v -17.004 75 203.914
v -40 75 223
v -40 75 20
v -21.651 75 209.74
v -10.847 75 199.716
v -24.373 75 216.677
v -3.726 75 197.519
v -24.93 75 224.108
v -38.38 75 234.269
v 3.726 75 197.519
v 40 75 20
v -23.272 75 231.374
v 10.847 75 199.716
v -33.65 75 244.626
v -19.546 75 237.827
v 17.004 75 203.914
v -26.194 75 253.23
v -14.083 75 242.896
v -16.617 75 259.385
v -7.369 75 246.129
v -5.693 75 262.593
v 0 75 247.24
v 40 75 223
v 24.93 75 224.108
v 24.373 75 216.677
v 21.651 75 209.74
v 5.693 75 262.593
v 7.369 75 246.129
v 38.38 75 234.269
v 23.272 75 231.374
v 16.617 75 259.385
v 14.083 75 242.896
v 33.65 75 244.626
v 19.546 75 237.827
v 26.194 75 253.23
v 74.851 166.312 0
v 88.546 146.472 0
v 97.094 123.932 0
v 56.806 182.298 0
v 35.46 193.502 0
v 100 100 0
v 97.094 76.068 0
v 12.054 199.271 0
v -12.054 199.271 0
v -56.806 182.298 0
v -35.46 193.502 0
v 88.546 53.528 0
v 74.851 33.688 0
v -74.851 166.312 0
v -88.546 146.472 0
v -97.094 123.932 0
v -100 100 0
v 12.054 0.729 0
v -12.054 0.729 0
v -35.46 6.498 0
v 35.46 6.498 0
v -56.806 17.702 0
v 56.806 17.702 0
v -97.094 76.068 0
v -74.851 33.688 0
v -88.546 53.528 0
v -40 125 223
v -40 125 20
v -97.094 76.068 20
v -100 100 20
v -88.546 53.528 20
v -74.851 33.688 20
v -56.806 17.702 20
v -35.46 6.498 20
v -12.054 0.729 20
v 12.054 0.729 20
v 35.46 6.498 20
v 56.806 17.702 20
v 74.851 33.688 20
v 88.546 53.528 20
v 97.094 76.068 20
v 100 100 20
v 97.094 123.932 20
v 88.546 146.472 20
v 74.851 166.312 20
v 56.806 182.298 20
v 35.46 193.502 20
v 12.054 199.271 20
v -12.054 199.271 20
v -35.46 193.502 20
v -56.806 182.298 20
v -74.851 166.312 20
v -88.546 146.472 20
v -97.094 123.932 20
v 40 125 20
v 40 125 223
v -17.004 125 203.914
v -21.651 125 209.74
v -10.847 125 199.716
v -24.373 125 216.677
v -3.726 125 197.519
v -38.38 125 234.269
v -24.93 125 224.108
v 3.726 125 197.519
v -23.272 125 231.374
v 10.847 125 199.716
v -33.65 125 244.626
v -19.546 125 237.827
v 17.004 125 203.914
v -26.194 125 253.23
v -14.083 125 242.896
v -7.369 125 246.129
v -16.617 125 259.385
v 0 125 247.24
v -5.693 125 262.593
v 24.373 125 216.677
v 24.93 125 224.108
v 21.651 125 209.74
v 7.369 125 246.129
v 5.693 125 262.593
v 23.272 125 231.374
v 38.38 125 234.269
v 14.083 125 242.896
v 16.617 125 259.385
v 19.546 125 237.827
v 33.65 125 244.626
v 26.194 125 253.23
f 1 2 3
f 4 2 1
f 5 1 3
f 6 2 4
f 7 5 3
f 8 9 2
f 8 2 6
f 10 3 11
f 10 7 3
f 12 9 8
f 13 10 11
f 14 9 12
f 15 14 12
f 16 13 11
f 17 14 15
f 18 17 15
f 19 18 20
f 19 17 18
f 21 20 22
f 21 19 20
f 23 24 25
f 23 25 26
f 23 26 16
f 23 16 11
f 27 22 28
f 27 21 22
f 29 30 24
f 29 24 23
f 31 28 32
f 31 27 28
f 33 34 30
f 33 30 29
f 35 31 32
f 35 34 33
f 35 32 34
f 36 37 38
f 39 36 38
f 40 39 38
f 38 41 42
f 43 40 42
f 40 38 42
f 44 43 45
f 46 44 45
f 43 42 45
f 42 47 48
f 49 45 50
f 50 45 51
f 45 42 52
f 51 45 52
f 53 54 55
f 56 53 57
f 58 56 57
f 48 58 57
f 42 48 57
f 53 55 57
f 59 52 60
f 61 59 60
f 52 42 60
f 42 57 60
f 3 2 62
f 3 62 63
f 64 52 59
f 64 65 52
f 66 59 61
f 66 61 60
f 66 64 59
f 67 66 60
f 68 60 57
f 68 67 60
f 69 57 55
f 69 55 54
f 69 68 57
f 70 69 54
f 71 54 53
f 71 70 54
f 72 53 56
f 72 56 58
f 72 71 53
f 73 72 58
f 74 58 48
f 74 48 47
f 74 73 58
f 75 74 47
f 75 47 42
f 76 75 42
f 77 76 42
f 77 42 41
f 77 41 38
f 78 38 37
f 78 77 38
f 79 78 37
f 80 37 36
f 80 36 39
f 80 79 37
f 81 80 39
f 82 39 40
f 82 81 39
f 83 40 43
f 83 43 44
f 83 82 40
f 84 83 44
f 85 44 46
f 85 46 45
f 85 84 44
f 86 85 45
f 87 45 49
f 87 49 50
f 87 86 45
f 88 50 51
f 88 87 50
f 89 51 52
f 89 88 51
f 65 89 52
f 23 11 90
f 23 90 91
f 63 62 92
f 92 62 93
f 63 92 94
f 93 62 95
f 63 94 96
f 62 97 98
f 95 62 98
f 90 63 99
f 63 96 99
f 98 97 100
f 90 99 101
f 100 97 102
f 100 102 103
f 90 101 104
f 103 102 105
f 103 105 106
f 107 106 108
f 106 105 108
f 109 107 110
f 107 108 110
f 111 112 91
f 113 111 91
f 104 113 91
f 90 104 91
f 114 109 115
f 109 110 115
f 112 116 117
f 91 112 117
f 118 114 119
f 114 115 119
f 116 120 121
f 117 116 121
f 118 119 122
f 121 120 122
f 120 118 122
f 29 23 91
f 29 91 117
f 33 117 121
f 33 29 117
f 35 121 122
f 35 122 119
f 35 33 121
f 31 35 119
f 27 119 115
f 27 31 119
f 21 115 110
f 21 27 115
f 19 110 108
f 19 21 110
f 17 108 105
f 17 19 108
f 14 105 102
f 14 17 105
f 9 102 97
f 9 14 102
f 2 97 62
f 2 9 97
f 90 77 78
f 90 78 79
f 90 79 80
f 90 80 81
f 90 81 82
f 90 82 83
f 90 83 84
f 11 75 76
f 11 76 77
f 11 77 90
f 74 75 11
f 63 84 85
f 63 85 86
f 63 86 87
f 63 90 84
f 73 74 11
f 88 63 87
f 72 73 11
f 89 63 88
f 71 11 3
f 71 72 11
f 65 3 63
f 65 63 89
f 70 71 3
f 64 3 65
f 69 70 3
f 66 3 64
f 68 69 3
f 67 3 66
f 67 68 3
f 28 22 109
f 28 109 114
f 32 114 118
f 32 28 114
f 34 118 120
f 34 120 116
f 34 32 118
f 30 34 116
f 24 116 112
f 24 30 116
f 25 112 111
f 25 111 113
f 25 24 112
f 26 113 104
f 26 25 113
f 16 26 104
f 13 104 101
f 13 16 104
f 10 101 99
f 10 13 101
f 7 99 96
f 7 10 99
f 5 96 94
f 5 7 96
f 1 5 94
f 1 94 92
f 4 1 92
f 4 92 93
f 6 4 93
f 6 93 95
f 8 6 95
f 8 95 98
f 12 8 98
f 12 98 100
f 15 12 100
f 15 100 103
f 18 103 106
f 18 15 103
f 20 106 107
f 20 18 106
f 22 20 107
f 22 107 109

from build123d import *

# Parameters (mm, degrees)
SKETCH1_W           = 100
SKETCH1_H           = 20
BOSS_EXTRUDE4_START = 75
SKETCH6_R           = 25
BOSS_EXTRUDE4_DEPTH = 50


with BuildPart() as part:
    # Sketch1 → Revolve1 (revolve)
    with BuildSketch(Plane.YZ):
        with Locations((50, 10)):
            Rectangle(SKETCH1_W, SKETCH1_H)
    revolve(axis=Axis((0, 100, 0), (0, 0, 1)))

    # Sketch6 → Boss-Extrude4 (add)
    with BuildSketch(Plane(origin=(0, 0, 0), x_dir=(-1, 0, 0), z_dir=(0, 1, 0)).offset(BOSS_EXTRUDE4_START)):
        with BuildLine():
            Line((40, 20), (-40, 20))
            Line((-40, 20), (-40, 223))
            ThreePointArc((-40, 223), (0, 263), (40, 223))
            Line((40, 223), (40, 20))
        make_face()
        with Locations((0, 222.24)):
            Circle(SKETCH6_R, mode=Mode.SUBTRACT)
    extrude(amount=BOSS_EXTRUDE4_DEPTH)


solid = part.part
